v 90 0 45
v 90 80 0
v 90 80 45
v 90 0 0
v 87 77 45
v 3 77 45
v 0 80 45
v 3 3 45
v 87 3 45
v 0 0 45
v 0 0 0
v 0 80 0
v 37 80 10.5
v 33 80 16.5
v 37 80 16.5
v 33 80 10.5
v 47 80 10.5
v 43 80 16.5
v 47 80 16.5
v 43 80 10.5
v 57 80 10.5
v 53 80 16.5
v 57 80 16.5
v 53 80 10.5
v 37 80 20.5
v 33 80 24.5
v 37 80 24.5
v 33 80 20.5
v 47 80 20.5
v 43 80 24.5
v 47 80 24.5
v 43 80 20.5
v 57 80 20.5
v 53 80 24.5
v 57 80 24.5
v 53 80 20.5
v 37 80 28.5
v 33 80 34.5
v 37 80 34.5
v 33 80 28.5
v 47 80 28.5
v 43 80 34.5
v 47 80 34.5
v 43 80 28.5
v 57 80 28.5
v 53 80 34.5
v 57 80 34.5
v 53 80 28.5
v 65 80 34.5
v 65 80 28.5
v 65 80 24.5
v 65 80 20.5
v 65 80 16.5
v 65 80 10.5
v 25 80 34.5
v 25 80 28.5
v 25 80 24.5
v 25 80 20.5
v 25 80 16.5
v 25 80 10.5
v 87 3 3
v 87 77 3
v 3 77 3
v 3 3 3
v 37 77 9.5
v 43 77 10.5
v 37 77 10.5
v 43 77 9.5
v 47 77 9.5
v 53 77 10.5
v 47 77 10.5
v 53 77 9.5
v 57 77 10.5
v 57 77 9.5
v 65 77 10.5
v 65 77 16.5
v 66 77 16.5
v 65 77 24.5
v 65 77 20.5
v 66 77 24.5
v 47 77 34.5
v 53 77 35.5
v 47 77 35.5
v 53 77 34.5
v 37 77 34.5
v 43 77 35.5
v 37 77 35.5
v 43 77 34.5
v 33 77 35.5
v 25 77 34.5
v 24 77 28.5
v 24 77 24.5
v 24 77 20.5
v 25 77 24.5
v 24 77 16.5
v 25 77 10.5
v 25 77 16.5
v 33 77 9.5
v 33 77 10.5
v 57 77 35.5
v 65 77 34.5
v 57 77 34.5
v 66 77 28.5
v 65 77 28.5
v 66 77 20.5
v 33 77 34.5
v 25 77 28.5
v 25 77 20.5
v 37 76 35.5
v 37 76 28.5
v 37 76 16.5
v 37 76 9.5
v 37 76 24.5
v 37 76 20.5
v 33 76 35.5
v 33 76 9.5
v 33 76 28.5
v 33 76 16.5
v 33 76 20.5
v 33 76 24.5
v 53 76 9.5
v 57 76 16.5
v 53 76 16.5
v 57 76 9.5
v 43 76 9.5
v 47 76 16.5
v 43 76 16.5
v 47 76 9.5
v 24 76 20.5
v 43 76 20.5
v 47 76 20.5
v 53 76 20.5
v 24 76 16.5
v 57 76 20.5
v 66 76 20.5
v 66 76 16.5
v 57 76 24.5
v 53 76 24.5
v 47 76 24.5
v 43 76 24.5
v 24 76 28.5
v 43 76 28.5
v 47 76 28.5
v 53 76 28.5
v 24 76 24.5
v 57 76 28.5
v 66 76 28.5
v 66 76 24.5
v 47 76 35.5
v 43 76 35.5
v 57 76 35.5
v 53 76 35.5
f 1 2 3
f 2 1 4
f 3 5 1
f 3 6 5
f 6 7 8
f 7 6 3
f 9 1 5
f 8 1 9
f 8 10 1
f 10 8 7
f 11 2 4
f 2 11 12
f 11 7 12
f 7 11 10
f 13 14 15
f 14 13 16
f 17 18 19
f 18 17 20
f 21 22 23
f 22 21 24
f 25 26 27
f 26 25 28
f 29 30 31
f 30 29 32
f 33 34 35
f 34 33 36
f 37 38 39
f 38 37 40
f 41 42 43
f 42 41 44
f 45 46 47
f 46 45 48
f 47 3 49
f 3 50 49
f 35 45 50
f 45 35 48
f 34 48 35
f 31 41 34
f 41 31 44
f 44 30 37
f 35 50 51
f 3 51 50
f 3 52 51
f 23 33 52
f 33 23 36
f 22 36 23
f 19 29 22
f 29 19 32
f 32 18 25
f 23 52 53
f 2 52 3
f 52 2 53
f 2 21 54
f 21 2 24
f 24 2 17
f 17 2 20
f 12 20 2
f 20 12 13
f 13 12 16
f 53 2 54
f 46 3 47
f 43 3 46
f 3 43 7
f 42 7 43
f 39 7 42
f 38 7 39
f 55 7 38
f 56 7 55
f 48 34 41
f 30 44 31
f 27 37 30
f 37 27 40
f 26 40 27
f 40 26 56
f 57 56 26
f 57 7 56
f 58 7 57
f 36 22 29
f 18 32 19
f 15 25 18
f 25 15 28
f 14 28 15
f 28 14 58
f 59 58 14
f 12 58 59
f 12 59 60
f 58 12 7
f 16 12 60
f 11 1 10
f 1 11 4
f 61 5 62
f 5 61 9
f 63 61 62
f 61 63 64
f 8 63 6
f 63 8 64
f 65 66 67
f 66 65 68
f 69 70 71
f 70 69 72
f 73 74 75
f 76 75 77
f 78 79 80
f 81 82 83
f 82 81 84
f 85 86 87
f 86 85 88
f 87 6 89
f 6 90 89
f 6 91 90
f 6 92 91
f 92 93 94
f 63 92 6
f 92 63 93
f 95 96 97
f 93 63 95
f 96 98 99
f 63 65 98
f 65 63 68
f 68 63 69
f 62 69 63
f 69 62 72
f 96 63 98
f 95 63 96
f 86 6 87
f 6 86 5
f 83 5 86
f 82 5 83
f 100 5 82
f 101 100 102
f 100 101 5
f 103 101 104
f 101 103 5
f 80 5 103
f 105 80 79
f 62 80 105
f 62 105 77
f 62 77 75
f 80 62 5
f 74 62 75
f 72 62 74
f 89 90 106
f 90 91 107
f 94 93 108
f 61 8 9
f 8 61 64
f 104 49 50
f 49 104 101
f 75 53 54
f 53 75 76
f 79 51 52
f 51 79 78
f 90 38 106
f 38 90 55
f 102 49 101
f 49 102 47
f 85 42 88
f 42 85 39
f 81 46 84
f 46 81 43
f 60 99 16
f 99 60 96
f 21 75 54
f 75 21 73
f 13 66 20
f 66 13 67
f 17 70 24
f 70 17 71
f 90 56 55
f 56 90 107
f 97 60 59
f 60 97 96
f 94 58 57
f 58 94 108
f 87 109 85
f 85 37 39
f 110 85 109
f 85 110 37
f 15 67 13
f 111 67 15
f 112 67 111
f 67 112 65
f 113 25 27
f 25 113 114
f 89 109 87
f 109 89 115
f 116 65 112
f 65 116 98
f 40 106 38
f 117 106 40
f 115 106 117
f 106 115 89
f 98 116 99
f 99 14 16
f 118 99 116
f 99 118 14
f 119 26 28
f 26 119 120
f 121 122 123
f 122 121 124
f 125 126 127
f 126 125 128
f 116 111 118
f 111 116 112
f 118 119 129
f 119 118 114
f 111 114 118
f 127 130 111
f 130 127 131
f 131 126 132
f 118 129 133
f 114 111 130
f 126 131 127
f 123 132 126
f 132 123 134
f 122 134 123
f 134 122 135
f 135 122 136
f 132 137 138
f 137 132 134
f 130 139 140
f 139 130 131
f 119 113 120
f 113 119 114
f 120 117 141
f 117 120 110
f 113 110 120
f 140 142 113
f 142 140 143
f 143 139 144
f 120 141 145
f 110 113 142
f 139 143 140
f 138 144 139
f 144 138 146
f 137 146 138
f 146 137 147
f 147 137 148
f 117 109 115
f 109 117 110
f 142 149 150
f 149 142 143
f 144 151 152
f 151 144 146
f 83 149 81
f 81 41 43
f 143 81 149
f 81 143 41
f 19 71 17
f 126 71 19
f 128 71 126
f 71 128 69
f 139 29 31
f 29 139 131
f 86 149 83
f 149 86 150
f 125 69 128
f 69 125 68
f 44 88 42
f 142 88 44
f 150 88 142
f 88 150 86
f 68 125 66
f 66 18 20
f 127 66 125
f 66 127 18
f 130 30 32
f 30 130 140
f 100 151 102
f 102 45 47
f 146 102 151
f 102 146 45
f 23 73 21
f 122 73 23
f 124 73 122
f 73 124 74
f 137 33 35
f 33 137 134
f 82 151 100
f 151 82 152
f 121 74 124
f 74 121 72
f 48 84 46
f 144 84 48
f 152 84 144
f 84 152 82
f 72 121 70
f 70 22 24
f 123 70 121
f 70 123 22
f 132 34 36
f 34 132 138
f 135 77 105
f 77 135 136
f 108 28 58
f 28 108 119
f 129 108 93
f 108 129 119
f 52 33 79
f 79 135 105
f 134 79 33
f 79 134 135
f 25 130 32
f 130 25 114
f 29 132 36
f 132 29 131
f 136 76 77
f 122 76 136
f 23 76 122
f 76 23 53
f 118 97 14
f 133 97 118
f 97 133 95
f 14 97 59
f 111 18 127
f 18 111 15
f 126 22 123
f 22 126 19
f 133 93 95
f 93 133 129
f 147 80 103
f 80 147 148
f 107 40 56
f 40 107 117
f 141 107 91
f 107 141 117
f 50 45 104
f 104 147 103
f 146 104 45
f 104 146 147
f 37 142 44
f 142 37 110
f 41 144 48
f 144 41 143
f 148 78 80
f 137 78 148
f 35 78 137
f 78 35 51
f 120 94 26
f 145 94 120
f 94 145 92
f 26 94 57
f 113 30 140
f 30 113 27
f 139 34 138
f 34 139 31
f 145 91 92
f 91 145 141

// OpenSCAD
$fn = 32;

// ----------------------------------------------------------------------
// Vent box: crossgrid enclosure
// ----------------------------------------------------------------------

// --- parameters (mm) ---
box_l = 90;               // box length, X
box_w = 80;               // box width, Y
box_h = 45;               // box height, Z
wall_t = 3;               // shell wall thickness
win_l = 40;               // vent window width, X
win_h = 24;               // vent window height, Z
bar_w = 4;                // grid bar width
n_v = 3;                  // vertical bar count
n_h = 2;                  // horizontal bar count

win_z0 = (box_h - win_h) / 2;  // window lower edge Z
v_step = win_l / (n_v + 1);  // vertical bar step
h_step = win_h / (n_h + 1);  // horizontal bar step

difference() {
  union() {
    difference() {
      cube([box_l, box_w, box_h]);
  translate([wall_t, wall_t, wall_t])
    cube([box_l - 2 * wall_t, box_w - 2 * wall_t, box_h]);
  translate([(box_l - win_l) / 2, box_w - wall_t - 1, win_z0])
    cube([win_l, wall_t + 2, win_h]);
    }
    for (i = [1 : n_v])
      translate([(box_l - win_l) / 2 + i * v_step - bar_w / 2,
                 box_w - wall_t - 1, win_z0 - 1])
        cube([bar_w, wall_t + 1, win_h + 2]);
    for (i = [1 : n_h])
      translate([(box_l - win_l) / 2 - 1, box_w - wall_t - 1,
                 win_z0 + i * h_step - bar_w / 2])
        cube([win_l + 2, wall_t + 1, bar_w]);
  }
}
